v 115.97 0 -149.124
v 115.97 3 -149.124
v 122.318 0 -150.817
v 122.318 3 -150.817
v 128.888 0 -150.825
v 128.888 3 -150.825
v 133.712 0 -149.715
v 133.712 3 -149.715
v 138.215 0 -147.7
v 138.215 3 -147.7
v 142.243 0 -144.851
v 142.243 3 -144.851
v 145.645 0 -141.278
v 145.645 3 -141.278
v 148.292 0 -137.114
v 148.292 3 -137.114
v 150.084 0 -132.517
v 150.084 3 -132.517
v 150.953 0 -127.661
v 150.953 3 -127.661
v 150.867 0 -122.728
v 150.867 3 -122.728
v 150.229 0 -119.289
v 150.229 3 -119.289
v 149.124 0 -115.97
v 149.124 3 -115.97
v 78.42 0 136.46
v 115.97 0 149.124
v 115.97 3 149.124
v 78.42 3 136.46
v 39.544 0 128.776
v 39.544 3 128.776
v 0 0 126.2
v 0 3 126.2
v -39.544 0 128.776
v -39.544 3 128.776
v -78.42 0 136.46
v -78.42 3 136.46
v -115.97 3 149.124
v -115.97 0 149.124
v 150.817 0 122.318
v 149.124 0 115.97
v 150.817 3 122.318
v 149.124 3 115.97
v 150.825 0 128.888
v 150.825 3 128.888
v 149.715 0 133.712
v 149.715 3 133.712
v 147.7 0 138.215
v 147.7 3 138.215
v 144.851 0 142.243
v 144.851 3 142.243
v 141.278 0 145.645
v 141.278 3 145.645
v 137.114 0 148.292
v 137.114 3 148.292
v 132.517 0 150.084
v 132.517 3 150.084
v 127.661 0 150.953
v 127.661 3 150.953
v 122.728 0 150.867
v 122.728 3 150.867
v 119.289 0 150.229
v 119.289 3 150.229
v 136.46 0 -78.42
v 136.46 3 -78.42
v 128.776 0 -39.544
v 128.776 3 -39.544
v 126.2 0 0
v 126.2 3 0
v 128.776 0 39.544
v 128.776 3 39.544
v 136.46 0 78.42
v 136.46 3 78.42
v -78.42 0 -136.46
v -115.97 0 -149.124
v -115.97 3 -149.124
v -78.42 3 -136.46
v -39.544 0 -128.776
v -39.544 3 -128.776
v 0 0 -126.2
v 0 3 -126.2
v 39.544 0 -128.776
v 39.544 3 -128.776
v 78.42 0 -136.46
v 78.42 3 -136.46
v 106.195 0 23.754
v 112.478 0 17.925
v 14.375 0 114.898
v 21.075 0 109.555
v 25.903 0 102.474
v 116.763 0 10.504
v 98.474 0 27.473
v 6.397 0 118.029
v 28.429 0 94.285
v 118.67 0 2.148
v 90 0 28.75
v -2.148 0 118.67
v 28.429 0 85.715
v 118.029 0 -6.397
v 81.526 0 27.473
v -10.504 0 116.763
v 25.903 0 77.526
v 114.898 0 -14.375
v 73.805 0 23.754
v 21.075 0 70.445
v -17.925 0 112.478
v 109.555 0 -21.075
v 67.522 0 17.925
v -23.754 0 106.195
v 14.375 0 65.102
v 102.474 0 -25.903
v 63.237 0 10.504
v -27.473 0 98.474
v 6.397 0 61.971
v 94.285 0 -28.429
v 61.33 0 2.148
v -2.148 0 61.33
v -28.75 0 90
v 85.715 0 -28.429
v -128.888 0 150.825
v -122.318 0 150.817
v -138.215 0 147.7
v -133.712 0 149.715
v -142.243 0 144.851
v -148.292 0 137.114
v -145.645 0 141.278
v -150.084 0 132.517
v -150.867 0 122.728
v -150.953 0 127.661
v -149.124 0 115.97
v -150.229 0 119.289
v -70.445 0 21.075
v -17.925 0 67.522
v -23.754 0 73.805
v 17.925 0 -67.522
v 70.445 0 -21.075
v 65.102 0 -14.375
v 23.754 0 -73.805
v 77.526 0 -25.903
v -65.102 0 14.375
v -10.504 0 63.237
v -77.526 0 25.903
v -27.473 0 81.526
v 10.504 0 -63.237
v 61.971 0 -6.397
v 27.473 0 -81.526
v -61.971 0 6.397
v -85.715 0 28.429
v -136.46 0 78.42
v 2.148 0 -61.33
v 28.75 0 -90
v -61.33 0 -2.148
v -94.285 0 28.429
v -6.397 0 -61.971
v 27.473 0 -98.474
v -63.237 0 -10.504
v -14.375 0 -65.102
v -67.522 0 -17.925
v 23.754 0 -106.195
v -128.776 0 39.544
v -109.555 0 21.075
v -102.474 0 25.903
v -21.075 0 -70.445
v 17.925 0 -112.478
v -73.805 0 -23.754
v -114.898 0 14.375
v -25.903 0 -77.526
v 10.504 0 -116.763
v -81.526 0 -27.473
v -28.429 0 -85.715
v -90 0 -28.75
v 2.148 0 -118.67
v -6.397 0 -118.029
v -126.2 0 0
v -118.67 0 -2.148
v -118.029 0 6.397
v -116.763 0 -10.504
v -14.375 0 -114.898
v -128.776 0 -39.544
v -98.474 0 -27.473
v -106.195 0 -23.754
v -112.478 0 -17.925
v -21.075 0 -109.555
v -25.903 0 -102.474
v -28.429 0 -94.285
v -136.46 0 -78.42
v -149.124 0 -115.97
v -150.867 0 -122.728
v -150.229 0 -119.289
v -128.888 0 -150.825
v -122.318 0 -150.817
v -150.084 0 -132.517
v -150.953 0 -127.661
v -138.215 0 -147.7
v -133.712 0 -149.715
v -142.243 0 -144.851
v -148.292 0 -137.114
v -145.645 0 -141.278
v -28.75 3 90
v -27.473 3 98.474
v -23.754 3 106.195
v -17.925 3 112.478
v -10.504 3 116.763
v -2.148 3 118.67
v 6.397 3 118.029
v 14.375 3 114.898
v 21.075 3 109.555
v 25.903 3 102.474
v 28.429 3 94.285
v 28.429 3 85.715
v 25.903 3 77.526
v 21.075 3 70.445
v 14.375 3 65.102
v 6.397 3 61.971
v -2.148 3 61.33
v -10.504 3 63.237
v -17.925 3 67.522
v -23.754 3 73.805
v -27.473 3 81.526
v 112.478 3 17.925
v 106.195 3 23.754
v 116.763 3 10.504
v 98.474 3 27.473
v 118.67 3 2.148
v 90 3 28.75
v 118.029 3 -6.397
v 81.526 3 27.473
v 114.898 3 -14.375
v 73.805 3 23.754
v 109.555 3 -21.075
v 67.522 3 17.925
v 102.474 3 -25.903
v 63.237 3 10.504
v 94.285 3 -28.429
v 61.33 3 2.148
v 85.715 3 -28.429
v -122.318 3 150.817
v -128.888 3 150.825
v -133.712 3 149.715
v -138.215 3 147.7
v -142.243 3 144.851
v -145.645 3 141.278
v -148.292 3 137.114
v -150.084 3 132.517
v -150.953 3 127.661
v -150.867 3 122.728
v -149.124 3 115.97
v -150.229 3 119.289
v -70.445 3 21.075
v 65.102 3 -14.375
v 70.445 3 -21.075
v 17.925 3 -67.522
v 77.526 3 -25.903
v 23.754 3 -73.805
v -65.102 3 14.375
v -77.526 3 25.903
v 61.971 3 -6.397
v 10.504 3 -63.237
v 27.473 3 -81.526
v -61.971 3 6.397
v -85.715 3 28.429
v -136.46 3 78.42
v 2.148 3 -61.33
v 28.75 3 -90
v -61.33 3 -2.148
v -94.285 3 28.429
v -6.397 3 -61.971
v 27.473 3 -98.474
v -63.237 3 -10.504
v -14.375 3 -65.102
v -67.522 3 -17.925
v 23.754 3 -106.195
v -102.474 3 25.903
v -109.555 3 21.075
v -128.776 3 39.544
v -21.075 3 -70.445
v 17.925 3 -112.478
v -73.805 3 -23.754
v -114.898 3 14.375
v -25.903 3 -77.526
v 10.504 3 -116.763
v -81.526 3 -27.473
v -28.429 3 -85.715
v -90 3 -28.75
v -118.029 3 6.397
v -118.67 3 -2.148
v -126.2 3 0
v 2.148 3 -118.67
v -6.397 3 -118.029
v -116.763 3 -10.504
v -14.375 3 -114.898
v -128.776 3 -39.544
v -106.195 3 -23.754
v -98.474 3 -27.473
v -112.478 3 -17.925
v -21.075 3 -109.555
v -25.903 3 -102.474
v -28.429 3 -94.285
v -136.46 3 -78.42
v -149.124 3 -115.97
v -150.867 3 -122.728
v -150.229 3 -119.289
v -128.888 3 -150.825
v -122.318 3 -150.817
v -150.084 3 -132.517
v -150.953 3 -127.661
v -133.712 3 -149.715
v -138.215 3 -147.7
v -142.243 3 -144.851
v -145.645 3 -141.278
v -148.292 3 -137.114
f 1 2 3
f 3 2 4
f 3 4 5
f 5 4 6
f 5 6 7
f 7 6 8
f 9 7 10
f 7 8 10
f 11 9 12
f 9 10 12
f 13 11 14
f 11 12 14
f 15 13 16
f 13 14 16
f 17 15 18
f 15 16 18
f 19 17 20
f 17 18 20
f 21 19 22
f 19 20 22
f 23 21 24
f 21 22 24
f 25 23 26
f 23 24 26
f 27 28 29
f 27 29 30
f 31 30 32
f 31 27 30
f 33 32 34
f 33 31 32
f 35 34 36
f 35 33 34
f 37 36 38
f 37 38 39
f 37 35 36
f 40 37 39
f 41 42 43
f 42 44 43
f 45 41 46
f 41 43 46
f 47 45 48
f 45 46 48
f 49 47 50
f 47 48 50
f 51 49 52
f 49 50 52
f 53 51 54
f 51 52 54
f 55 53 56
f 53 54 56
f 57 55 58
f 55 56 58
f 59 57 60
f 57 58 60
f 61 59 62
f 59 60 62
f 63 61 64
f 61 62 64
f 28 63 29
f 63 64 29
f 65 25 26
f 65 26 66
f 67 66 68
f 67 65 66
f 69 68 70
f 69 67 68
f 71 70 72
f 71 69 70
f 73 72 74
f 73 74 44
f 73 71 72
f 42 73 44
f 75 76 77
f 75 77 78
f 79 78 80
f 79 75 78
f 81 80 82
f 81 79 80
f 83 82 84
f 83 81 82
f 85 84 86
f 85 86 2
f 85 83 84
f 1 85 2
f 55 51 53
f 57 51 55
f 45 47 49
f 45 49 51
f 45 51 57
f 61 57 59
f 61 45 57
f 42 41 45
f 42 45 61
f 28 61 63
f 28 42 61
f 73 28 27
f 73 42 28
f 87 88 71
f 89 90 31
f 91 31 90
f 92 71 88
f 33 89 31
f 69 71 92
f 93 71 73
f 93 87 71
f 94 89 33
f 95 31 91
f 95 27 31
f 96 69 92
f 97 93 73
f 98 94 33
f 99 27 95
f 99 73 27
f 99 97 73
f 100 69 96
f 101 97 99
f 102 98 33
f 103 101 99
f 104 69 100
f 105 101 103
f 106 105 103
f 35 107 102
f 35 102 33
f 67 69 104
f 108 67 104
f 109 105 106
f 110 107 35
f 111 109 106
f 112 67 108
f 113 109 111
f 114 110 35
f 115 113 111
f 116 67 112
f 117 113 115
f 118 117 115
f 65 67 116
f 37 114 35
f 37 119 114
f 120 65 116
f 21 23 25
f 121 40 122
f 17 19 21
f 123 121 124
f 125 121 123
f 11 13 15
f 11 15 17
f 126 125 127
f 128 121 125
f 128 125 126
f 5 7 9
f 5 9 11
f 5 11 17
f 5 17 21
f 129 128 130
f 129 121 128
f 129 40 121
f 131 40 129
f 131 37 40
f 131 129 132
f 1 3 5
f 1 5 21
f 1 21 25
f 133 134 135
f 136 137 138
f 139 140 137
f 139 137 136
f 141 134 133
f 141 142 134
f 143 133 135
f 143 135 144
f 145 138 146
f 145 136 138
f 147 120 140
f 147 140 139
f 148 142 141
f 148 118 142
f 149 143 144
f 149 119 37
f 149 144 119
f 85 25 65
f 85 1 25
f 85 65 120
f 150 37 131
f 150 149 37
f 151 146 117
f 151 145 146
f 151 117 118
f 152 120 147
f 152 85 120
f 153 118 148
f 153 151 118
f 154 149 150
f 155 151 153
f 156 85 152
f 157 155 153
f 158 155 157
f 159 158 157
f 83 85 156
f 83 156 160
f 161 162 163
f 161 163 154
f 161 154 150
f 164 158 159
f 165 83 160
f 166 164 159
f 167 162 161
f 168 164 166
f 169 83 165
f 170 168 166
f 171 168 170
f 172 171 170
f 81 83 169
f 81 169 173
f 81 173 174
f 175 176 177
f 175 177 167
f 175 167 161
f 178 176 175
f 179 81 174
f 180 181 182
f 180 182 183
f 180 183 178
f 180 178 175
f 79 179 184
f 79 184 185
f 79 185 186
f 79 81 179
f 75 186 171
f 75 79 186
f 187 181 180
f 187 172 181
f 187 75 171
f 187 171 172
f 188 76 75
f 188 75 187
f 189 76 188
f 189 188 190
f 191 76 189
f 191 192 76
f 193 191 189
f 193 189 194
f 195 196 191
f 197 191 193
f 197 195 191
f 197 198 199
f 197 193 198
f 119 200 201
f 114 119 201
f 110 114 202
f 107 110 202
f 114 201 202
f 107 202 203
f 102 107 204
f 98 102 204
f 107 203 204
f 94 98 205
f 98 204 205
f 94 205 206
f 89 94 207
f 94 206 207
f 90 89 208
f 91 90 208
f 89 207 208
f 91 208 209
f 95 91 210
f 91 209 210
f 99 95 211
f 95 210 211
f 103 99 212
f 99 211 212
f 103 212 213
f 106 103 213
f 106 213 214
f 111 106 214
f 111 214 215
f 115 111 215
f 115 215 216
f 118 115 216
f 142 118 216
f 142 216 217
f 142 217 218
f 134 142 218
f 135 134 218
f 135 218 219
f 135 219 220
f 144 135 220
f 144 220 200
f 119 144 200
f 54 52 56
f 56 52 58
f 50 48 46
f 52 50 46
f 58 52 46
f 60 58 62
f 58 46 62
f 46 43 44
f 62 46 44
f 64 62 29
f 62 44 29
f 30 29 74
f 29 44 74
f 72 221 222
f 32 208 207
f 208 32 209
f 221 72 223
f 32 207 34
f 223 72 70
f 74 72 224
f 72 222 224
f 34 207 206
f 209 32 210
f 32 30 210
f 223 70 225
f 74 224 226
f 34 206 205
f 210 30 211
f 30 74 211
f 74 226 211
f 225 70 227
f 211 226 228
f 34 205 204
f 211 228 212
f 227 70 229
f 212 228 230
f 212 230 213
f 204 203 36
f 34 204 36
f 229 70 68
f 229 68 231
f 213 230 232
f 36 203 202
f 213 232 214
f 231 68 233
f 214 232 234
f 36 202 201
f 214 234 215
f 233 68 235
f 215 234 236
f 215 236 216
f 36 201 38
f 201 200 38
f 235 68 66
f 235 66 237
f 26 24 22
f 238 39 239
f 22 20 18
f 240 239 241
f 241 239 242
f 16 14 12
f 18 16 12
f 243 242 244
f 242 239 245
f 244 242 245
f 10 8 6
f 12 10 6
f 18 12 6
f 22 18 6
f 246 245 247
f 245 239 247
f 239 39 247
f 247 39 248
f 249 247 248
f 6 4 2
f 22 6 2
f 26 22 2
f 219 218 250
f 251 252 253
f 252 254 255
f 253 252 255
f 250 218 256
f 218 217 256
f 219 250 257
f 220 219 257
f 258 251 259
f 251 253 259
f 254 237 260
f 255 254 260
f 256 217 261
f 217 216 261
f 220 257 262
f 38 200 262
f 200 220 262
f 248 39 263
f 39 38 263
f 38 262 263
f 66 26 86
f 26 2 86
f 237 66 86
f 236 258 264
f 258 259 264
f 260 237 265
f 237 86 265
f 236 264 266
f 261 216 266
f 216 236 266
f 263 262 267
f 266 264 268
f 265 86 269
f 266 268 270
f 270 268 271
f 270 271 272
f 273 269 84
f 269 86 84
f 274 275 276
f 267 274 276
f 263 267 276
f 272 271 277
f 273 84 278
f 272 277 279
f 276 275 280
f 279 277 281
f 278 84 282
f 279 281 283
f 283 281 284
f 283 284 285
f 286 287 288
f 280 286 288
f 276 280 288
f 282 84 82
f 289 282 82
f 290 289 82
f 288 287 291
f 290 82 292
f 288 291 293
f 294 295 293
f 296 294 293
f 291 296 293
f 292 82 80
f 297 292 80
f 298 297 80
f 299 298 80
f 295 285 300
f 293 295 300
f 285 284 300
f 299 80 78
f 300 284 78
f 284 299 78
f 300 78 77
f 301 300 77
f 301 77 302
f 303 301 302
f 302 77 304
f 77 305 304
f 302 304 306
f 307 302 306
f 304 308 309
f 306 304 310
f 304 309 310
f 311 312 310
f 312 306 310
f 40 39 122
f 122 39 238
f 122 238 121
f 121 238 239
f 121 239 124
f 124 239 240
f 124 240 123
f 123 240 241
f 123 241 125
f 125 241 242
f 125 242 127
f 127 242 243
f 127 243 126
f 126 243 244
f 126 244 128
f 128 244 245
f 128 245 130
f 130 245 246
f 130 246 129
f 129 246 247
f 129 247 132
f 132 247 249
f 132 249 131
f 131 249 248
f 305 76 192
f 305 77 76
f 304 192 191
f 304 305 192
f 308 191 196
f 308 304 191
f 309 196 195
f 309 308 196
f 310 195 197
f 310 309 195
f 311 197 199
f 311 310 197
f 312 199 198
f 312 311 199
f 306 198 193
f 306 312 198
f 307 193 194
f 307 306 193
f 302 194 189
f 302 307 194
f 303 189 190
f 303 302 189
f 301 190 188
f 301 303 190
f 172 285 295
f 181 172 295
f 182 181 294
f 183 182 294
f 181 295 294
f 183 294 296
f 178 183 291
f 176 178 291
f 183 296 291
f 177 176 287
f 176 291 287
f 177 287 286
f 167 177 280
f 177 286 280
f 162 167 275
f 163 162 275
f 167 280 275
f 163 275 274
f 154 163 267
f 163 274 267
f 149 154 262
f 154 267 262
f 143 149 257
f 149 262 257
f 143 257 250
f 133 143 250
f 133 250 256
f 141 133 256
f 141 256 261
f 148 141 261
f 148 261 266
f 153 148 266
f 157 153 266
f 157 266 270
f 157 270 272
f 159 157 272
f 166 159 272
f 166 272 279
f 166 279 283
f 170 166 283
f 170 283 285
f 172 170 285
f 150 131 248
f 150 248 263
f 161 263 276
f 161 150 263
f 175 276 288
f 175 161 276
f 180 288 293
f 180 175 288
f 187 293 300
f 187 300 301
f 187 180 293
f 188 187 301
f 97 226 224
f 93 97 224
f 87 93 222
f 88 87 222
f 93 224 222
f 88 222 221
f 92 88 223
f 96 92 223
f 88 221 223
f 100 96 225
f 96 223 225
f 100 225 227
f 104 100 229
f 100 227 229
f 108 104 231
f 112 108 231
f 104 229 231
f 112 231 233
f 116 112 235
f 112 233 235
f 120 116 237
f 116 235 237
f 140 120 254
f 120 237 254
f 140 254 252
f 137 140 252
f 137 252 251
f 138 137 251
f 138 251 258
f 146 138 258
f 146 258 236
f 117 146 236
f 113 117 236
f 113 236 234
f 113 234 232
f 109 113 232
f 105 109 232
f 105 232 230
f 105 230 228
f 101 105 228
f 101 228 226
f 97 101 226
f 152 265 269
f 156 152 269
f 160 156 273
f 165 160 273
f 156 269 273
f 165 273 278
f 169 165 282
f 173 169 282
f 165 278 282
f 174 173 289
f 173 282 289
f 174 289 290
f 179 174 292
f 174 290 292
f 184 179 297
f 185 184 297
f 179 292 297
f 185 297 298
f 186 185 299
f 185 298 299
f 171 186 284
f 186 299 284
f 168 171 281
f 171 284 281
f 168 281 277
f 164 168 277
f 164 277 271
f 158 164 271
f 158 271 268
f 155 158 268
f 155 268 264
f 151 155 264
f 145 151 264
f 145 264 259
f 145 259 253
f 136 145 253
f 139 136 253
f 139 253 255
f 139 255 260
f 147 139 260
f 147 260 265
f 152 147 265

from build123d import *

# Parameters (mm, degrees)
BOSS_EXTRUDE1_DEPTH = 3
FILLET1_R           = 25.4
SKETCH3_R           = 28.75
CUT_EXTRUDE1_DEPTH  = 214.615601591
CIRPATTERN1_COUNT   = 4


with BuildPart() as part:
    # Sketch2 → Boss-Extrude1 (new body)
    with BuildSketch(Plane(origin=(0, 0, 0), x_dir=(1, 0, 0), z_dir=(0, 1, 0))):
        with BuildLine():
            ThreePointArc((212.132034356, 212.132034356), (0, 126.199665585), (-212.132034356, 212.132034356))
            ThreePointArc((-212.132034356, 212.132034356), (-126.199665585, 0), (-212.132034356, -212.132034356))
            ThreePointArc((-212.132034356, -212.132034356), (0, -126.199665585), (212.132034356, -212.132034356))
            ThreePointArc((212.132034356, -212.132034356), (126.199665585, 0), (212.132034356, 212.132034356))
        make_face()
    extrude(amount=BOSS_EXTRUDE1_DEPTH)

    # Fillet1
    fillet1_edges = [part.edges().sort_by_distance(p)[0] for p in [
        (212.132034356, 1.5, -212.132034356),
        (212.132034356, 1.5, 212.132034356),
        (-212.132034356, 1.5, -212.132034356),
        (-212.132034356, 1.5, 212.132034356),
    ]]
    fillet(fillet1_edges, radius=FILLET1_R)

    # Sketch3 → Cut-Extrude1 (cut, through all)
    with BuildSketch(Plane(origin=(0, 3, 0), x_dir=(1, 0, 0), z_dir=(0, 1, 0))):
        with Locations((90, 0)):
            Circle(SKETCH3_R)
    cut_extrude1 = extrude(amount=-CUT_EXTRUDE1_DEPTH, mode=Mode.SUBTRACT)

    # CirPattern1: Cut-Extrude1 ×4 about axis
    cirpattern1_axis = Axis((0, 3.15, 0), (0, -1, 0))
    for i in range(1, CIRPATTERN1_COUNT):
        add(cut_extrude1.rotate(cirpattern1_axis, i * 360 / CIRPATTERN1_COUNT), mode=Mode.SUBTRACT)


solid = part.part
